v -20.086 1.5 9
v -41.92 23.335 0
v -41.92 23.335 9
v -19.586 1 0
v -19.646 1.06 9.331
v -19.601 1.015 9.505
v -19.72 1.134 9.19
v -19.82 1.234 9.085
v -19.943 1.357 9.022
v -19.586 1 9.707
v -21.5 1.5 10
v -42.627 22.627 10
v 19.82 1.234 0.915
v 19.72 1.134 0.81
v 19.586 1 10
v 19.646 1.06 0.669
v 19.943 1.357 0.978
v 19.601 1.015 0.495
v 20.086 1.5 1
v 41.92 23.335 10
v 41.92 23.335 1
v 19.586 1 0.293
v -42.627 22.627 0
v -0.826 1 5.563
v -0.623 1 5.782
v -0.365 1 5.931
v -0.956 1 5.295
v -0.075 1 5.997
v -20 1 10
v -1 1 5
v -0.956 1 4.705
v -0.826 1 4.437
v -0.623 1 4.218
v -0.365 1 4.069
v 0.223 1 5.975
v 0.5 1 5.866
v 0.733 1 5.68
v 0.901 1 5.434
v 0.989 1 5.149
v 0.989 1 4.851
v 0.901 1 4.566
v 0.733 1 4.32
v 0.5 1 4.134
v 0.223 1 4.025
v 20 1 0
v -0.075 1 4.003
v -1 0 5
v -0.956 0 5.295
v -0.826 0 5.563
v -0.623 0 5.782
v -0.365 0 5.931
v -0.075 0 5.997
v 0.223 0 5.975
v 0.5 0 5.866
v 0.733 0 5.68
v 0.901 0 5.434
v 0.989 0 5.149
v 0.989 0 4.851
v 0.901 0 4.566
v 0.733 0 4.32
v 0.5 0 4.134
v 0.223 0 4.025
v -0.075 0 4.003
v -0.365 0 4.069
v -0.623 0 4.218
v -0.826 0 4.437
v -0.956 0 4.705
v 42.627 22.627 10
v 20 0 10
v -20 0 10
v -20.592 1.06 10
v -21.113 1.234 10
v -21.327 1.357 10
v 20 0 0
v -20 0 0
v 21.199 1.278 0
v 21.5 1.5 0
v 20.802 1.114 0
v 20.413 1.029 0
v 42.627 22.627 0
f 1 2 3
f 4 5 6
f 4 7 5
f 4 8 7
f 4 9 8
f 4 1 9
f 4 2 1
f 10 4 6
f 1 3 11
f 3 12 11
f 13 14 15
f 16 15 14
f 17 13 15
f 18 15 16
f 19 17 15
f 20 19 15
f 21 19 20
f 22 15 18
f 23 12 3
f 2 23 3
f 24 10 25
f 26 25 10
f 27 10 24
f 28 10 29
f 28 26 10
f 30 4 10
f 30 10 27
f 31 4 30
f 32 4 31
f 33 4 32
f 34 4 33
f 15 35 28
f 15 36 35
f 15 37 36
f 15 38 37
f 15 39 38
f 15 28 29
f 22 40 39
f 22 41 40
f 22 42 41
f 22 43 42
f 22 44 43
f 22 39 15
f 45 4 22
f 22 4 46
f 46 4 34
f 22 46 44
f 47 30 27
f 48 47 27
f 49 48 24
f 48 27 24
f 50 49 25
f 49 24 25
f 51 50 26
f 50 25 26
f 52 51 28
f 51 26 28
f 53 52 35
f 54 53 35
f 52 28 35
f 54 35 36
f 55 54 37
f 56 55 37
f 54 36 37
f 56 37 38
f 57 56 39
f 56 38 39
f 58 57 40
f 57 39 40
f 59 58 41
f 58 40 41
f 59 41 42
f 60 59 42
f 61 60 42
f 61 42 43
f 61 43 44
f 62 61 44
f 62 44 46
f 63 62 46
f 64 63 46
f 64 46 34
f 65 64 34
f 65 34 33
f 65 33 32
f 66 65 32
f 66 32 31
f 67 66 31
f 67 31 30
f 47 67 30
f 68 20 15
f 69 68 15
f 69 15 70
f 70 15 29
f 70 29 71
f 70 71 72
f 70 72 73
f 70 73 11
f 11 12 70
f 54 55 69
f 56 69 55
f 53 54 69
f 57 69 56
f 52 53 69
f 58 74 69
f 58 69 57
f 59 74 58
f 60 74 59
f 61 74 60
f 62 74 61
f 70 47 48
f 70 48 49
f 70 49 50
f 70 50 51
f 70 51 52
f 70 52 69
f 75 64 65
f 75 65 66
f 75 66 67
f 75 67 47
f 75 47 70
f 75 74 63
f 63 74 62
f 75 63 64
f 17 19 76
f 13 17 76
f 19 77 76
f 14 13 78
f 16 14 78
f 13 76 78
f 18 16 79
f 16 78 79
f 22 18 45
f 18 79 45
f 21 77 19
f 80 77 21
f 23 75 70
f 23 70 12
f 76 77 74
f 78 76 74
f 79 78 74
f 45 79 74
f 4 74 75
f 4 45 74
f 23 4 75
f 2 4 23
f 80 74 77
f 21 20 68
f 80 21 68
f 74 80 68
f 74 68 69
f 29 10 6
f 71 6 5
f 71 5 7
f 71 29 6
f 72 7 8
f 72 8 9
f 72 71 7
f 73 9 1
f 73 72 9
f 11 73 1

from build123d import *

# Parameters (mm, degrees)
BLADE_EXTRUDE_DEPTH        = 10
BLADE_CUT_SIZE             = 1
EDGE_ROUNDING_R            = 1
SKETCH2_R                  = 1
HOLE_FOR_SCREW_BLADE_DEPTH = 10


with BuildPart() as part:
    # Sketch1 → Blade Extrude (new body)
    with BuildSketch(Plane.XY):
        Polygon((20, 0), (-20, 0), (-42.627416998, 22.627416998), (-41.920310217, 23.334523779), (-19.585786438, 1), (19.585786438, 1), (41.920310217, 23.334523779), (42.627416998, 22.627416998), align=None)
    extrude(amount=BLADE_EXTRUDE_DEPTH)

    # Blade Cut
    blade_cut_edges = [part.edges().sort_by_distance(p)[0] for p in [
        (30.753048327, 12.16726189, 0),
        (-30.753048327, 12.16726189, 10),
    ]]
    chamfer(blade_cut_edges, length=BLADE_CUT_SIZE - 0.0001)  # a hair under: the kernel refuses the full size

    # Edge Rounding
    edge_rounding_edges = [part.edges().sort_by_distance(p)[0] for p in [
        (20.292822508, 1, 0.49995),
        (-20.292822508, 1, 9.50005),
    ]]
    fillet(edge_rounding_edges, radius=EDGE_ROUNDING_R)

    # Sketch2 → Hole for Screw (Blade) (cut)
    with BuildSketch(Plane(origin=(0, 1, 0), x_dir=(1, 0, 0), z_dir=(0, 1, 0))):
        with Locations(Location((0, -5, 0), (0, 0, 180))):
            Circle(SKETCH2_R)
    extrude(amount=-HOLE_FOR_SCREW_BLADE_DEPTH, mode=Mode.SUBTRACT)


solid = part.part
